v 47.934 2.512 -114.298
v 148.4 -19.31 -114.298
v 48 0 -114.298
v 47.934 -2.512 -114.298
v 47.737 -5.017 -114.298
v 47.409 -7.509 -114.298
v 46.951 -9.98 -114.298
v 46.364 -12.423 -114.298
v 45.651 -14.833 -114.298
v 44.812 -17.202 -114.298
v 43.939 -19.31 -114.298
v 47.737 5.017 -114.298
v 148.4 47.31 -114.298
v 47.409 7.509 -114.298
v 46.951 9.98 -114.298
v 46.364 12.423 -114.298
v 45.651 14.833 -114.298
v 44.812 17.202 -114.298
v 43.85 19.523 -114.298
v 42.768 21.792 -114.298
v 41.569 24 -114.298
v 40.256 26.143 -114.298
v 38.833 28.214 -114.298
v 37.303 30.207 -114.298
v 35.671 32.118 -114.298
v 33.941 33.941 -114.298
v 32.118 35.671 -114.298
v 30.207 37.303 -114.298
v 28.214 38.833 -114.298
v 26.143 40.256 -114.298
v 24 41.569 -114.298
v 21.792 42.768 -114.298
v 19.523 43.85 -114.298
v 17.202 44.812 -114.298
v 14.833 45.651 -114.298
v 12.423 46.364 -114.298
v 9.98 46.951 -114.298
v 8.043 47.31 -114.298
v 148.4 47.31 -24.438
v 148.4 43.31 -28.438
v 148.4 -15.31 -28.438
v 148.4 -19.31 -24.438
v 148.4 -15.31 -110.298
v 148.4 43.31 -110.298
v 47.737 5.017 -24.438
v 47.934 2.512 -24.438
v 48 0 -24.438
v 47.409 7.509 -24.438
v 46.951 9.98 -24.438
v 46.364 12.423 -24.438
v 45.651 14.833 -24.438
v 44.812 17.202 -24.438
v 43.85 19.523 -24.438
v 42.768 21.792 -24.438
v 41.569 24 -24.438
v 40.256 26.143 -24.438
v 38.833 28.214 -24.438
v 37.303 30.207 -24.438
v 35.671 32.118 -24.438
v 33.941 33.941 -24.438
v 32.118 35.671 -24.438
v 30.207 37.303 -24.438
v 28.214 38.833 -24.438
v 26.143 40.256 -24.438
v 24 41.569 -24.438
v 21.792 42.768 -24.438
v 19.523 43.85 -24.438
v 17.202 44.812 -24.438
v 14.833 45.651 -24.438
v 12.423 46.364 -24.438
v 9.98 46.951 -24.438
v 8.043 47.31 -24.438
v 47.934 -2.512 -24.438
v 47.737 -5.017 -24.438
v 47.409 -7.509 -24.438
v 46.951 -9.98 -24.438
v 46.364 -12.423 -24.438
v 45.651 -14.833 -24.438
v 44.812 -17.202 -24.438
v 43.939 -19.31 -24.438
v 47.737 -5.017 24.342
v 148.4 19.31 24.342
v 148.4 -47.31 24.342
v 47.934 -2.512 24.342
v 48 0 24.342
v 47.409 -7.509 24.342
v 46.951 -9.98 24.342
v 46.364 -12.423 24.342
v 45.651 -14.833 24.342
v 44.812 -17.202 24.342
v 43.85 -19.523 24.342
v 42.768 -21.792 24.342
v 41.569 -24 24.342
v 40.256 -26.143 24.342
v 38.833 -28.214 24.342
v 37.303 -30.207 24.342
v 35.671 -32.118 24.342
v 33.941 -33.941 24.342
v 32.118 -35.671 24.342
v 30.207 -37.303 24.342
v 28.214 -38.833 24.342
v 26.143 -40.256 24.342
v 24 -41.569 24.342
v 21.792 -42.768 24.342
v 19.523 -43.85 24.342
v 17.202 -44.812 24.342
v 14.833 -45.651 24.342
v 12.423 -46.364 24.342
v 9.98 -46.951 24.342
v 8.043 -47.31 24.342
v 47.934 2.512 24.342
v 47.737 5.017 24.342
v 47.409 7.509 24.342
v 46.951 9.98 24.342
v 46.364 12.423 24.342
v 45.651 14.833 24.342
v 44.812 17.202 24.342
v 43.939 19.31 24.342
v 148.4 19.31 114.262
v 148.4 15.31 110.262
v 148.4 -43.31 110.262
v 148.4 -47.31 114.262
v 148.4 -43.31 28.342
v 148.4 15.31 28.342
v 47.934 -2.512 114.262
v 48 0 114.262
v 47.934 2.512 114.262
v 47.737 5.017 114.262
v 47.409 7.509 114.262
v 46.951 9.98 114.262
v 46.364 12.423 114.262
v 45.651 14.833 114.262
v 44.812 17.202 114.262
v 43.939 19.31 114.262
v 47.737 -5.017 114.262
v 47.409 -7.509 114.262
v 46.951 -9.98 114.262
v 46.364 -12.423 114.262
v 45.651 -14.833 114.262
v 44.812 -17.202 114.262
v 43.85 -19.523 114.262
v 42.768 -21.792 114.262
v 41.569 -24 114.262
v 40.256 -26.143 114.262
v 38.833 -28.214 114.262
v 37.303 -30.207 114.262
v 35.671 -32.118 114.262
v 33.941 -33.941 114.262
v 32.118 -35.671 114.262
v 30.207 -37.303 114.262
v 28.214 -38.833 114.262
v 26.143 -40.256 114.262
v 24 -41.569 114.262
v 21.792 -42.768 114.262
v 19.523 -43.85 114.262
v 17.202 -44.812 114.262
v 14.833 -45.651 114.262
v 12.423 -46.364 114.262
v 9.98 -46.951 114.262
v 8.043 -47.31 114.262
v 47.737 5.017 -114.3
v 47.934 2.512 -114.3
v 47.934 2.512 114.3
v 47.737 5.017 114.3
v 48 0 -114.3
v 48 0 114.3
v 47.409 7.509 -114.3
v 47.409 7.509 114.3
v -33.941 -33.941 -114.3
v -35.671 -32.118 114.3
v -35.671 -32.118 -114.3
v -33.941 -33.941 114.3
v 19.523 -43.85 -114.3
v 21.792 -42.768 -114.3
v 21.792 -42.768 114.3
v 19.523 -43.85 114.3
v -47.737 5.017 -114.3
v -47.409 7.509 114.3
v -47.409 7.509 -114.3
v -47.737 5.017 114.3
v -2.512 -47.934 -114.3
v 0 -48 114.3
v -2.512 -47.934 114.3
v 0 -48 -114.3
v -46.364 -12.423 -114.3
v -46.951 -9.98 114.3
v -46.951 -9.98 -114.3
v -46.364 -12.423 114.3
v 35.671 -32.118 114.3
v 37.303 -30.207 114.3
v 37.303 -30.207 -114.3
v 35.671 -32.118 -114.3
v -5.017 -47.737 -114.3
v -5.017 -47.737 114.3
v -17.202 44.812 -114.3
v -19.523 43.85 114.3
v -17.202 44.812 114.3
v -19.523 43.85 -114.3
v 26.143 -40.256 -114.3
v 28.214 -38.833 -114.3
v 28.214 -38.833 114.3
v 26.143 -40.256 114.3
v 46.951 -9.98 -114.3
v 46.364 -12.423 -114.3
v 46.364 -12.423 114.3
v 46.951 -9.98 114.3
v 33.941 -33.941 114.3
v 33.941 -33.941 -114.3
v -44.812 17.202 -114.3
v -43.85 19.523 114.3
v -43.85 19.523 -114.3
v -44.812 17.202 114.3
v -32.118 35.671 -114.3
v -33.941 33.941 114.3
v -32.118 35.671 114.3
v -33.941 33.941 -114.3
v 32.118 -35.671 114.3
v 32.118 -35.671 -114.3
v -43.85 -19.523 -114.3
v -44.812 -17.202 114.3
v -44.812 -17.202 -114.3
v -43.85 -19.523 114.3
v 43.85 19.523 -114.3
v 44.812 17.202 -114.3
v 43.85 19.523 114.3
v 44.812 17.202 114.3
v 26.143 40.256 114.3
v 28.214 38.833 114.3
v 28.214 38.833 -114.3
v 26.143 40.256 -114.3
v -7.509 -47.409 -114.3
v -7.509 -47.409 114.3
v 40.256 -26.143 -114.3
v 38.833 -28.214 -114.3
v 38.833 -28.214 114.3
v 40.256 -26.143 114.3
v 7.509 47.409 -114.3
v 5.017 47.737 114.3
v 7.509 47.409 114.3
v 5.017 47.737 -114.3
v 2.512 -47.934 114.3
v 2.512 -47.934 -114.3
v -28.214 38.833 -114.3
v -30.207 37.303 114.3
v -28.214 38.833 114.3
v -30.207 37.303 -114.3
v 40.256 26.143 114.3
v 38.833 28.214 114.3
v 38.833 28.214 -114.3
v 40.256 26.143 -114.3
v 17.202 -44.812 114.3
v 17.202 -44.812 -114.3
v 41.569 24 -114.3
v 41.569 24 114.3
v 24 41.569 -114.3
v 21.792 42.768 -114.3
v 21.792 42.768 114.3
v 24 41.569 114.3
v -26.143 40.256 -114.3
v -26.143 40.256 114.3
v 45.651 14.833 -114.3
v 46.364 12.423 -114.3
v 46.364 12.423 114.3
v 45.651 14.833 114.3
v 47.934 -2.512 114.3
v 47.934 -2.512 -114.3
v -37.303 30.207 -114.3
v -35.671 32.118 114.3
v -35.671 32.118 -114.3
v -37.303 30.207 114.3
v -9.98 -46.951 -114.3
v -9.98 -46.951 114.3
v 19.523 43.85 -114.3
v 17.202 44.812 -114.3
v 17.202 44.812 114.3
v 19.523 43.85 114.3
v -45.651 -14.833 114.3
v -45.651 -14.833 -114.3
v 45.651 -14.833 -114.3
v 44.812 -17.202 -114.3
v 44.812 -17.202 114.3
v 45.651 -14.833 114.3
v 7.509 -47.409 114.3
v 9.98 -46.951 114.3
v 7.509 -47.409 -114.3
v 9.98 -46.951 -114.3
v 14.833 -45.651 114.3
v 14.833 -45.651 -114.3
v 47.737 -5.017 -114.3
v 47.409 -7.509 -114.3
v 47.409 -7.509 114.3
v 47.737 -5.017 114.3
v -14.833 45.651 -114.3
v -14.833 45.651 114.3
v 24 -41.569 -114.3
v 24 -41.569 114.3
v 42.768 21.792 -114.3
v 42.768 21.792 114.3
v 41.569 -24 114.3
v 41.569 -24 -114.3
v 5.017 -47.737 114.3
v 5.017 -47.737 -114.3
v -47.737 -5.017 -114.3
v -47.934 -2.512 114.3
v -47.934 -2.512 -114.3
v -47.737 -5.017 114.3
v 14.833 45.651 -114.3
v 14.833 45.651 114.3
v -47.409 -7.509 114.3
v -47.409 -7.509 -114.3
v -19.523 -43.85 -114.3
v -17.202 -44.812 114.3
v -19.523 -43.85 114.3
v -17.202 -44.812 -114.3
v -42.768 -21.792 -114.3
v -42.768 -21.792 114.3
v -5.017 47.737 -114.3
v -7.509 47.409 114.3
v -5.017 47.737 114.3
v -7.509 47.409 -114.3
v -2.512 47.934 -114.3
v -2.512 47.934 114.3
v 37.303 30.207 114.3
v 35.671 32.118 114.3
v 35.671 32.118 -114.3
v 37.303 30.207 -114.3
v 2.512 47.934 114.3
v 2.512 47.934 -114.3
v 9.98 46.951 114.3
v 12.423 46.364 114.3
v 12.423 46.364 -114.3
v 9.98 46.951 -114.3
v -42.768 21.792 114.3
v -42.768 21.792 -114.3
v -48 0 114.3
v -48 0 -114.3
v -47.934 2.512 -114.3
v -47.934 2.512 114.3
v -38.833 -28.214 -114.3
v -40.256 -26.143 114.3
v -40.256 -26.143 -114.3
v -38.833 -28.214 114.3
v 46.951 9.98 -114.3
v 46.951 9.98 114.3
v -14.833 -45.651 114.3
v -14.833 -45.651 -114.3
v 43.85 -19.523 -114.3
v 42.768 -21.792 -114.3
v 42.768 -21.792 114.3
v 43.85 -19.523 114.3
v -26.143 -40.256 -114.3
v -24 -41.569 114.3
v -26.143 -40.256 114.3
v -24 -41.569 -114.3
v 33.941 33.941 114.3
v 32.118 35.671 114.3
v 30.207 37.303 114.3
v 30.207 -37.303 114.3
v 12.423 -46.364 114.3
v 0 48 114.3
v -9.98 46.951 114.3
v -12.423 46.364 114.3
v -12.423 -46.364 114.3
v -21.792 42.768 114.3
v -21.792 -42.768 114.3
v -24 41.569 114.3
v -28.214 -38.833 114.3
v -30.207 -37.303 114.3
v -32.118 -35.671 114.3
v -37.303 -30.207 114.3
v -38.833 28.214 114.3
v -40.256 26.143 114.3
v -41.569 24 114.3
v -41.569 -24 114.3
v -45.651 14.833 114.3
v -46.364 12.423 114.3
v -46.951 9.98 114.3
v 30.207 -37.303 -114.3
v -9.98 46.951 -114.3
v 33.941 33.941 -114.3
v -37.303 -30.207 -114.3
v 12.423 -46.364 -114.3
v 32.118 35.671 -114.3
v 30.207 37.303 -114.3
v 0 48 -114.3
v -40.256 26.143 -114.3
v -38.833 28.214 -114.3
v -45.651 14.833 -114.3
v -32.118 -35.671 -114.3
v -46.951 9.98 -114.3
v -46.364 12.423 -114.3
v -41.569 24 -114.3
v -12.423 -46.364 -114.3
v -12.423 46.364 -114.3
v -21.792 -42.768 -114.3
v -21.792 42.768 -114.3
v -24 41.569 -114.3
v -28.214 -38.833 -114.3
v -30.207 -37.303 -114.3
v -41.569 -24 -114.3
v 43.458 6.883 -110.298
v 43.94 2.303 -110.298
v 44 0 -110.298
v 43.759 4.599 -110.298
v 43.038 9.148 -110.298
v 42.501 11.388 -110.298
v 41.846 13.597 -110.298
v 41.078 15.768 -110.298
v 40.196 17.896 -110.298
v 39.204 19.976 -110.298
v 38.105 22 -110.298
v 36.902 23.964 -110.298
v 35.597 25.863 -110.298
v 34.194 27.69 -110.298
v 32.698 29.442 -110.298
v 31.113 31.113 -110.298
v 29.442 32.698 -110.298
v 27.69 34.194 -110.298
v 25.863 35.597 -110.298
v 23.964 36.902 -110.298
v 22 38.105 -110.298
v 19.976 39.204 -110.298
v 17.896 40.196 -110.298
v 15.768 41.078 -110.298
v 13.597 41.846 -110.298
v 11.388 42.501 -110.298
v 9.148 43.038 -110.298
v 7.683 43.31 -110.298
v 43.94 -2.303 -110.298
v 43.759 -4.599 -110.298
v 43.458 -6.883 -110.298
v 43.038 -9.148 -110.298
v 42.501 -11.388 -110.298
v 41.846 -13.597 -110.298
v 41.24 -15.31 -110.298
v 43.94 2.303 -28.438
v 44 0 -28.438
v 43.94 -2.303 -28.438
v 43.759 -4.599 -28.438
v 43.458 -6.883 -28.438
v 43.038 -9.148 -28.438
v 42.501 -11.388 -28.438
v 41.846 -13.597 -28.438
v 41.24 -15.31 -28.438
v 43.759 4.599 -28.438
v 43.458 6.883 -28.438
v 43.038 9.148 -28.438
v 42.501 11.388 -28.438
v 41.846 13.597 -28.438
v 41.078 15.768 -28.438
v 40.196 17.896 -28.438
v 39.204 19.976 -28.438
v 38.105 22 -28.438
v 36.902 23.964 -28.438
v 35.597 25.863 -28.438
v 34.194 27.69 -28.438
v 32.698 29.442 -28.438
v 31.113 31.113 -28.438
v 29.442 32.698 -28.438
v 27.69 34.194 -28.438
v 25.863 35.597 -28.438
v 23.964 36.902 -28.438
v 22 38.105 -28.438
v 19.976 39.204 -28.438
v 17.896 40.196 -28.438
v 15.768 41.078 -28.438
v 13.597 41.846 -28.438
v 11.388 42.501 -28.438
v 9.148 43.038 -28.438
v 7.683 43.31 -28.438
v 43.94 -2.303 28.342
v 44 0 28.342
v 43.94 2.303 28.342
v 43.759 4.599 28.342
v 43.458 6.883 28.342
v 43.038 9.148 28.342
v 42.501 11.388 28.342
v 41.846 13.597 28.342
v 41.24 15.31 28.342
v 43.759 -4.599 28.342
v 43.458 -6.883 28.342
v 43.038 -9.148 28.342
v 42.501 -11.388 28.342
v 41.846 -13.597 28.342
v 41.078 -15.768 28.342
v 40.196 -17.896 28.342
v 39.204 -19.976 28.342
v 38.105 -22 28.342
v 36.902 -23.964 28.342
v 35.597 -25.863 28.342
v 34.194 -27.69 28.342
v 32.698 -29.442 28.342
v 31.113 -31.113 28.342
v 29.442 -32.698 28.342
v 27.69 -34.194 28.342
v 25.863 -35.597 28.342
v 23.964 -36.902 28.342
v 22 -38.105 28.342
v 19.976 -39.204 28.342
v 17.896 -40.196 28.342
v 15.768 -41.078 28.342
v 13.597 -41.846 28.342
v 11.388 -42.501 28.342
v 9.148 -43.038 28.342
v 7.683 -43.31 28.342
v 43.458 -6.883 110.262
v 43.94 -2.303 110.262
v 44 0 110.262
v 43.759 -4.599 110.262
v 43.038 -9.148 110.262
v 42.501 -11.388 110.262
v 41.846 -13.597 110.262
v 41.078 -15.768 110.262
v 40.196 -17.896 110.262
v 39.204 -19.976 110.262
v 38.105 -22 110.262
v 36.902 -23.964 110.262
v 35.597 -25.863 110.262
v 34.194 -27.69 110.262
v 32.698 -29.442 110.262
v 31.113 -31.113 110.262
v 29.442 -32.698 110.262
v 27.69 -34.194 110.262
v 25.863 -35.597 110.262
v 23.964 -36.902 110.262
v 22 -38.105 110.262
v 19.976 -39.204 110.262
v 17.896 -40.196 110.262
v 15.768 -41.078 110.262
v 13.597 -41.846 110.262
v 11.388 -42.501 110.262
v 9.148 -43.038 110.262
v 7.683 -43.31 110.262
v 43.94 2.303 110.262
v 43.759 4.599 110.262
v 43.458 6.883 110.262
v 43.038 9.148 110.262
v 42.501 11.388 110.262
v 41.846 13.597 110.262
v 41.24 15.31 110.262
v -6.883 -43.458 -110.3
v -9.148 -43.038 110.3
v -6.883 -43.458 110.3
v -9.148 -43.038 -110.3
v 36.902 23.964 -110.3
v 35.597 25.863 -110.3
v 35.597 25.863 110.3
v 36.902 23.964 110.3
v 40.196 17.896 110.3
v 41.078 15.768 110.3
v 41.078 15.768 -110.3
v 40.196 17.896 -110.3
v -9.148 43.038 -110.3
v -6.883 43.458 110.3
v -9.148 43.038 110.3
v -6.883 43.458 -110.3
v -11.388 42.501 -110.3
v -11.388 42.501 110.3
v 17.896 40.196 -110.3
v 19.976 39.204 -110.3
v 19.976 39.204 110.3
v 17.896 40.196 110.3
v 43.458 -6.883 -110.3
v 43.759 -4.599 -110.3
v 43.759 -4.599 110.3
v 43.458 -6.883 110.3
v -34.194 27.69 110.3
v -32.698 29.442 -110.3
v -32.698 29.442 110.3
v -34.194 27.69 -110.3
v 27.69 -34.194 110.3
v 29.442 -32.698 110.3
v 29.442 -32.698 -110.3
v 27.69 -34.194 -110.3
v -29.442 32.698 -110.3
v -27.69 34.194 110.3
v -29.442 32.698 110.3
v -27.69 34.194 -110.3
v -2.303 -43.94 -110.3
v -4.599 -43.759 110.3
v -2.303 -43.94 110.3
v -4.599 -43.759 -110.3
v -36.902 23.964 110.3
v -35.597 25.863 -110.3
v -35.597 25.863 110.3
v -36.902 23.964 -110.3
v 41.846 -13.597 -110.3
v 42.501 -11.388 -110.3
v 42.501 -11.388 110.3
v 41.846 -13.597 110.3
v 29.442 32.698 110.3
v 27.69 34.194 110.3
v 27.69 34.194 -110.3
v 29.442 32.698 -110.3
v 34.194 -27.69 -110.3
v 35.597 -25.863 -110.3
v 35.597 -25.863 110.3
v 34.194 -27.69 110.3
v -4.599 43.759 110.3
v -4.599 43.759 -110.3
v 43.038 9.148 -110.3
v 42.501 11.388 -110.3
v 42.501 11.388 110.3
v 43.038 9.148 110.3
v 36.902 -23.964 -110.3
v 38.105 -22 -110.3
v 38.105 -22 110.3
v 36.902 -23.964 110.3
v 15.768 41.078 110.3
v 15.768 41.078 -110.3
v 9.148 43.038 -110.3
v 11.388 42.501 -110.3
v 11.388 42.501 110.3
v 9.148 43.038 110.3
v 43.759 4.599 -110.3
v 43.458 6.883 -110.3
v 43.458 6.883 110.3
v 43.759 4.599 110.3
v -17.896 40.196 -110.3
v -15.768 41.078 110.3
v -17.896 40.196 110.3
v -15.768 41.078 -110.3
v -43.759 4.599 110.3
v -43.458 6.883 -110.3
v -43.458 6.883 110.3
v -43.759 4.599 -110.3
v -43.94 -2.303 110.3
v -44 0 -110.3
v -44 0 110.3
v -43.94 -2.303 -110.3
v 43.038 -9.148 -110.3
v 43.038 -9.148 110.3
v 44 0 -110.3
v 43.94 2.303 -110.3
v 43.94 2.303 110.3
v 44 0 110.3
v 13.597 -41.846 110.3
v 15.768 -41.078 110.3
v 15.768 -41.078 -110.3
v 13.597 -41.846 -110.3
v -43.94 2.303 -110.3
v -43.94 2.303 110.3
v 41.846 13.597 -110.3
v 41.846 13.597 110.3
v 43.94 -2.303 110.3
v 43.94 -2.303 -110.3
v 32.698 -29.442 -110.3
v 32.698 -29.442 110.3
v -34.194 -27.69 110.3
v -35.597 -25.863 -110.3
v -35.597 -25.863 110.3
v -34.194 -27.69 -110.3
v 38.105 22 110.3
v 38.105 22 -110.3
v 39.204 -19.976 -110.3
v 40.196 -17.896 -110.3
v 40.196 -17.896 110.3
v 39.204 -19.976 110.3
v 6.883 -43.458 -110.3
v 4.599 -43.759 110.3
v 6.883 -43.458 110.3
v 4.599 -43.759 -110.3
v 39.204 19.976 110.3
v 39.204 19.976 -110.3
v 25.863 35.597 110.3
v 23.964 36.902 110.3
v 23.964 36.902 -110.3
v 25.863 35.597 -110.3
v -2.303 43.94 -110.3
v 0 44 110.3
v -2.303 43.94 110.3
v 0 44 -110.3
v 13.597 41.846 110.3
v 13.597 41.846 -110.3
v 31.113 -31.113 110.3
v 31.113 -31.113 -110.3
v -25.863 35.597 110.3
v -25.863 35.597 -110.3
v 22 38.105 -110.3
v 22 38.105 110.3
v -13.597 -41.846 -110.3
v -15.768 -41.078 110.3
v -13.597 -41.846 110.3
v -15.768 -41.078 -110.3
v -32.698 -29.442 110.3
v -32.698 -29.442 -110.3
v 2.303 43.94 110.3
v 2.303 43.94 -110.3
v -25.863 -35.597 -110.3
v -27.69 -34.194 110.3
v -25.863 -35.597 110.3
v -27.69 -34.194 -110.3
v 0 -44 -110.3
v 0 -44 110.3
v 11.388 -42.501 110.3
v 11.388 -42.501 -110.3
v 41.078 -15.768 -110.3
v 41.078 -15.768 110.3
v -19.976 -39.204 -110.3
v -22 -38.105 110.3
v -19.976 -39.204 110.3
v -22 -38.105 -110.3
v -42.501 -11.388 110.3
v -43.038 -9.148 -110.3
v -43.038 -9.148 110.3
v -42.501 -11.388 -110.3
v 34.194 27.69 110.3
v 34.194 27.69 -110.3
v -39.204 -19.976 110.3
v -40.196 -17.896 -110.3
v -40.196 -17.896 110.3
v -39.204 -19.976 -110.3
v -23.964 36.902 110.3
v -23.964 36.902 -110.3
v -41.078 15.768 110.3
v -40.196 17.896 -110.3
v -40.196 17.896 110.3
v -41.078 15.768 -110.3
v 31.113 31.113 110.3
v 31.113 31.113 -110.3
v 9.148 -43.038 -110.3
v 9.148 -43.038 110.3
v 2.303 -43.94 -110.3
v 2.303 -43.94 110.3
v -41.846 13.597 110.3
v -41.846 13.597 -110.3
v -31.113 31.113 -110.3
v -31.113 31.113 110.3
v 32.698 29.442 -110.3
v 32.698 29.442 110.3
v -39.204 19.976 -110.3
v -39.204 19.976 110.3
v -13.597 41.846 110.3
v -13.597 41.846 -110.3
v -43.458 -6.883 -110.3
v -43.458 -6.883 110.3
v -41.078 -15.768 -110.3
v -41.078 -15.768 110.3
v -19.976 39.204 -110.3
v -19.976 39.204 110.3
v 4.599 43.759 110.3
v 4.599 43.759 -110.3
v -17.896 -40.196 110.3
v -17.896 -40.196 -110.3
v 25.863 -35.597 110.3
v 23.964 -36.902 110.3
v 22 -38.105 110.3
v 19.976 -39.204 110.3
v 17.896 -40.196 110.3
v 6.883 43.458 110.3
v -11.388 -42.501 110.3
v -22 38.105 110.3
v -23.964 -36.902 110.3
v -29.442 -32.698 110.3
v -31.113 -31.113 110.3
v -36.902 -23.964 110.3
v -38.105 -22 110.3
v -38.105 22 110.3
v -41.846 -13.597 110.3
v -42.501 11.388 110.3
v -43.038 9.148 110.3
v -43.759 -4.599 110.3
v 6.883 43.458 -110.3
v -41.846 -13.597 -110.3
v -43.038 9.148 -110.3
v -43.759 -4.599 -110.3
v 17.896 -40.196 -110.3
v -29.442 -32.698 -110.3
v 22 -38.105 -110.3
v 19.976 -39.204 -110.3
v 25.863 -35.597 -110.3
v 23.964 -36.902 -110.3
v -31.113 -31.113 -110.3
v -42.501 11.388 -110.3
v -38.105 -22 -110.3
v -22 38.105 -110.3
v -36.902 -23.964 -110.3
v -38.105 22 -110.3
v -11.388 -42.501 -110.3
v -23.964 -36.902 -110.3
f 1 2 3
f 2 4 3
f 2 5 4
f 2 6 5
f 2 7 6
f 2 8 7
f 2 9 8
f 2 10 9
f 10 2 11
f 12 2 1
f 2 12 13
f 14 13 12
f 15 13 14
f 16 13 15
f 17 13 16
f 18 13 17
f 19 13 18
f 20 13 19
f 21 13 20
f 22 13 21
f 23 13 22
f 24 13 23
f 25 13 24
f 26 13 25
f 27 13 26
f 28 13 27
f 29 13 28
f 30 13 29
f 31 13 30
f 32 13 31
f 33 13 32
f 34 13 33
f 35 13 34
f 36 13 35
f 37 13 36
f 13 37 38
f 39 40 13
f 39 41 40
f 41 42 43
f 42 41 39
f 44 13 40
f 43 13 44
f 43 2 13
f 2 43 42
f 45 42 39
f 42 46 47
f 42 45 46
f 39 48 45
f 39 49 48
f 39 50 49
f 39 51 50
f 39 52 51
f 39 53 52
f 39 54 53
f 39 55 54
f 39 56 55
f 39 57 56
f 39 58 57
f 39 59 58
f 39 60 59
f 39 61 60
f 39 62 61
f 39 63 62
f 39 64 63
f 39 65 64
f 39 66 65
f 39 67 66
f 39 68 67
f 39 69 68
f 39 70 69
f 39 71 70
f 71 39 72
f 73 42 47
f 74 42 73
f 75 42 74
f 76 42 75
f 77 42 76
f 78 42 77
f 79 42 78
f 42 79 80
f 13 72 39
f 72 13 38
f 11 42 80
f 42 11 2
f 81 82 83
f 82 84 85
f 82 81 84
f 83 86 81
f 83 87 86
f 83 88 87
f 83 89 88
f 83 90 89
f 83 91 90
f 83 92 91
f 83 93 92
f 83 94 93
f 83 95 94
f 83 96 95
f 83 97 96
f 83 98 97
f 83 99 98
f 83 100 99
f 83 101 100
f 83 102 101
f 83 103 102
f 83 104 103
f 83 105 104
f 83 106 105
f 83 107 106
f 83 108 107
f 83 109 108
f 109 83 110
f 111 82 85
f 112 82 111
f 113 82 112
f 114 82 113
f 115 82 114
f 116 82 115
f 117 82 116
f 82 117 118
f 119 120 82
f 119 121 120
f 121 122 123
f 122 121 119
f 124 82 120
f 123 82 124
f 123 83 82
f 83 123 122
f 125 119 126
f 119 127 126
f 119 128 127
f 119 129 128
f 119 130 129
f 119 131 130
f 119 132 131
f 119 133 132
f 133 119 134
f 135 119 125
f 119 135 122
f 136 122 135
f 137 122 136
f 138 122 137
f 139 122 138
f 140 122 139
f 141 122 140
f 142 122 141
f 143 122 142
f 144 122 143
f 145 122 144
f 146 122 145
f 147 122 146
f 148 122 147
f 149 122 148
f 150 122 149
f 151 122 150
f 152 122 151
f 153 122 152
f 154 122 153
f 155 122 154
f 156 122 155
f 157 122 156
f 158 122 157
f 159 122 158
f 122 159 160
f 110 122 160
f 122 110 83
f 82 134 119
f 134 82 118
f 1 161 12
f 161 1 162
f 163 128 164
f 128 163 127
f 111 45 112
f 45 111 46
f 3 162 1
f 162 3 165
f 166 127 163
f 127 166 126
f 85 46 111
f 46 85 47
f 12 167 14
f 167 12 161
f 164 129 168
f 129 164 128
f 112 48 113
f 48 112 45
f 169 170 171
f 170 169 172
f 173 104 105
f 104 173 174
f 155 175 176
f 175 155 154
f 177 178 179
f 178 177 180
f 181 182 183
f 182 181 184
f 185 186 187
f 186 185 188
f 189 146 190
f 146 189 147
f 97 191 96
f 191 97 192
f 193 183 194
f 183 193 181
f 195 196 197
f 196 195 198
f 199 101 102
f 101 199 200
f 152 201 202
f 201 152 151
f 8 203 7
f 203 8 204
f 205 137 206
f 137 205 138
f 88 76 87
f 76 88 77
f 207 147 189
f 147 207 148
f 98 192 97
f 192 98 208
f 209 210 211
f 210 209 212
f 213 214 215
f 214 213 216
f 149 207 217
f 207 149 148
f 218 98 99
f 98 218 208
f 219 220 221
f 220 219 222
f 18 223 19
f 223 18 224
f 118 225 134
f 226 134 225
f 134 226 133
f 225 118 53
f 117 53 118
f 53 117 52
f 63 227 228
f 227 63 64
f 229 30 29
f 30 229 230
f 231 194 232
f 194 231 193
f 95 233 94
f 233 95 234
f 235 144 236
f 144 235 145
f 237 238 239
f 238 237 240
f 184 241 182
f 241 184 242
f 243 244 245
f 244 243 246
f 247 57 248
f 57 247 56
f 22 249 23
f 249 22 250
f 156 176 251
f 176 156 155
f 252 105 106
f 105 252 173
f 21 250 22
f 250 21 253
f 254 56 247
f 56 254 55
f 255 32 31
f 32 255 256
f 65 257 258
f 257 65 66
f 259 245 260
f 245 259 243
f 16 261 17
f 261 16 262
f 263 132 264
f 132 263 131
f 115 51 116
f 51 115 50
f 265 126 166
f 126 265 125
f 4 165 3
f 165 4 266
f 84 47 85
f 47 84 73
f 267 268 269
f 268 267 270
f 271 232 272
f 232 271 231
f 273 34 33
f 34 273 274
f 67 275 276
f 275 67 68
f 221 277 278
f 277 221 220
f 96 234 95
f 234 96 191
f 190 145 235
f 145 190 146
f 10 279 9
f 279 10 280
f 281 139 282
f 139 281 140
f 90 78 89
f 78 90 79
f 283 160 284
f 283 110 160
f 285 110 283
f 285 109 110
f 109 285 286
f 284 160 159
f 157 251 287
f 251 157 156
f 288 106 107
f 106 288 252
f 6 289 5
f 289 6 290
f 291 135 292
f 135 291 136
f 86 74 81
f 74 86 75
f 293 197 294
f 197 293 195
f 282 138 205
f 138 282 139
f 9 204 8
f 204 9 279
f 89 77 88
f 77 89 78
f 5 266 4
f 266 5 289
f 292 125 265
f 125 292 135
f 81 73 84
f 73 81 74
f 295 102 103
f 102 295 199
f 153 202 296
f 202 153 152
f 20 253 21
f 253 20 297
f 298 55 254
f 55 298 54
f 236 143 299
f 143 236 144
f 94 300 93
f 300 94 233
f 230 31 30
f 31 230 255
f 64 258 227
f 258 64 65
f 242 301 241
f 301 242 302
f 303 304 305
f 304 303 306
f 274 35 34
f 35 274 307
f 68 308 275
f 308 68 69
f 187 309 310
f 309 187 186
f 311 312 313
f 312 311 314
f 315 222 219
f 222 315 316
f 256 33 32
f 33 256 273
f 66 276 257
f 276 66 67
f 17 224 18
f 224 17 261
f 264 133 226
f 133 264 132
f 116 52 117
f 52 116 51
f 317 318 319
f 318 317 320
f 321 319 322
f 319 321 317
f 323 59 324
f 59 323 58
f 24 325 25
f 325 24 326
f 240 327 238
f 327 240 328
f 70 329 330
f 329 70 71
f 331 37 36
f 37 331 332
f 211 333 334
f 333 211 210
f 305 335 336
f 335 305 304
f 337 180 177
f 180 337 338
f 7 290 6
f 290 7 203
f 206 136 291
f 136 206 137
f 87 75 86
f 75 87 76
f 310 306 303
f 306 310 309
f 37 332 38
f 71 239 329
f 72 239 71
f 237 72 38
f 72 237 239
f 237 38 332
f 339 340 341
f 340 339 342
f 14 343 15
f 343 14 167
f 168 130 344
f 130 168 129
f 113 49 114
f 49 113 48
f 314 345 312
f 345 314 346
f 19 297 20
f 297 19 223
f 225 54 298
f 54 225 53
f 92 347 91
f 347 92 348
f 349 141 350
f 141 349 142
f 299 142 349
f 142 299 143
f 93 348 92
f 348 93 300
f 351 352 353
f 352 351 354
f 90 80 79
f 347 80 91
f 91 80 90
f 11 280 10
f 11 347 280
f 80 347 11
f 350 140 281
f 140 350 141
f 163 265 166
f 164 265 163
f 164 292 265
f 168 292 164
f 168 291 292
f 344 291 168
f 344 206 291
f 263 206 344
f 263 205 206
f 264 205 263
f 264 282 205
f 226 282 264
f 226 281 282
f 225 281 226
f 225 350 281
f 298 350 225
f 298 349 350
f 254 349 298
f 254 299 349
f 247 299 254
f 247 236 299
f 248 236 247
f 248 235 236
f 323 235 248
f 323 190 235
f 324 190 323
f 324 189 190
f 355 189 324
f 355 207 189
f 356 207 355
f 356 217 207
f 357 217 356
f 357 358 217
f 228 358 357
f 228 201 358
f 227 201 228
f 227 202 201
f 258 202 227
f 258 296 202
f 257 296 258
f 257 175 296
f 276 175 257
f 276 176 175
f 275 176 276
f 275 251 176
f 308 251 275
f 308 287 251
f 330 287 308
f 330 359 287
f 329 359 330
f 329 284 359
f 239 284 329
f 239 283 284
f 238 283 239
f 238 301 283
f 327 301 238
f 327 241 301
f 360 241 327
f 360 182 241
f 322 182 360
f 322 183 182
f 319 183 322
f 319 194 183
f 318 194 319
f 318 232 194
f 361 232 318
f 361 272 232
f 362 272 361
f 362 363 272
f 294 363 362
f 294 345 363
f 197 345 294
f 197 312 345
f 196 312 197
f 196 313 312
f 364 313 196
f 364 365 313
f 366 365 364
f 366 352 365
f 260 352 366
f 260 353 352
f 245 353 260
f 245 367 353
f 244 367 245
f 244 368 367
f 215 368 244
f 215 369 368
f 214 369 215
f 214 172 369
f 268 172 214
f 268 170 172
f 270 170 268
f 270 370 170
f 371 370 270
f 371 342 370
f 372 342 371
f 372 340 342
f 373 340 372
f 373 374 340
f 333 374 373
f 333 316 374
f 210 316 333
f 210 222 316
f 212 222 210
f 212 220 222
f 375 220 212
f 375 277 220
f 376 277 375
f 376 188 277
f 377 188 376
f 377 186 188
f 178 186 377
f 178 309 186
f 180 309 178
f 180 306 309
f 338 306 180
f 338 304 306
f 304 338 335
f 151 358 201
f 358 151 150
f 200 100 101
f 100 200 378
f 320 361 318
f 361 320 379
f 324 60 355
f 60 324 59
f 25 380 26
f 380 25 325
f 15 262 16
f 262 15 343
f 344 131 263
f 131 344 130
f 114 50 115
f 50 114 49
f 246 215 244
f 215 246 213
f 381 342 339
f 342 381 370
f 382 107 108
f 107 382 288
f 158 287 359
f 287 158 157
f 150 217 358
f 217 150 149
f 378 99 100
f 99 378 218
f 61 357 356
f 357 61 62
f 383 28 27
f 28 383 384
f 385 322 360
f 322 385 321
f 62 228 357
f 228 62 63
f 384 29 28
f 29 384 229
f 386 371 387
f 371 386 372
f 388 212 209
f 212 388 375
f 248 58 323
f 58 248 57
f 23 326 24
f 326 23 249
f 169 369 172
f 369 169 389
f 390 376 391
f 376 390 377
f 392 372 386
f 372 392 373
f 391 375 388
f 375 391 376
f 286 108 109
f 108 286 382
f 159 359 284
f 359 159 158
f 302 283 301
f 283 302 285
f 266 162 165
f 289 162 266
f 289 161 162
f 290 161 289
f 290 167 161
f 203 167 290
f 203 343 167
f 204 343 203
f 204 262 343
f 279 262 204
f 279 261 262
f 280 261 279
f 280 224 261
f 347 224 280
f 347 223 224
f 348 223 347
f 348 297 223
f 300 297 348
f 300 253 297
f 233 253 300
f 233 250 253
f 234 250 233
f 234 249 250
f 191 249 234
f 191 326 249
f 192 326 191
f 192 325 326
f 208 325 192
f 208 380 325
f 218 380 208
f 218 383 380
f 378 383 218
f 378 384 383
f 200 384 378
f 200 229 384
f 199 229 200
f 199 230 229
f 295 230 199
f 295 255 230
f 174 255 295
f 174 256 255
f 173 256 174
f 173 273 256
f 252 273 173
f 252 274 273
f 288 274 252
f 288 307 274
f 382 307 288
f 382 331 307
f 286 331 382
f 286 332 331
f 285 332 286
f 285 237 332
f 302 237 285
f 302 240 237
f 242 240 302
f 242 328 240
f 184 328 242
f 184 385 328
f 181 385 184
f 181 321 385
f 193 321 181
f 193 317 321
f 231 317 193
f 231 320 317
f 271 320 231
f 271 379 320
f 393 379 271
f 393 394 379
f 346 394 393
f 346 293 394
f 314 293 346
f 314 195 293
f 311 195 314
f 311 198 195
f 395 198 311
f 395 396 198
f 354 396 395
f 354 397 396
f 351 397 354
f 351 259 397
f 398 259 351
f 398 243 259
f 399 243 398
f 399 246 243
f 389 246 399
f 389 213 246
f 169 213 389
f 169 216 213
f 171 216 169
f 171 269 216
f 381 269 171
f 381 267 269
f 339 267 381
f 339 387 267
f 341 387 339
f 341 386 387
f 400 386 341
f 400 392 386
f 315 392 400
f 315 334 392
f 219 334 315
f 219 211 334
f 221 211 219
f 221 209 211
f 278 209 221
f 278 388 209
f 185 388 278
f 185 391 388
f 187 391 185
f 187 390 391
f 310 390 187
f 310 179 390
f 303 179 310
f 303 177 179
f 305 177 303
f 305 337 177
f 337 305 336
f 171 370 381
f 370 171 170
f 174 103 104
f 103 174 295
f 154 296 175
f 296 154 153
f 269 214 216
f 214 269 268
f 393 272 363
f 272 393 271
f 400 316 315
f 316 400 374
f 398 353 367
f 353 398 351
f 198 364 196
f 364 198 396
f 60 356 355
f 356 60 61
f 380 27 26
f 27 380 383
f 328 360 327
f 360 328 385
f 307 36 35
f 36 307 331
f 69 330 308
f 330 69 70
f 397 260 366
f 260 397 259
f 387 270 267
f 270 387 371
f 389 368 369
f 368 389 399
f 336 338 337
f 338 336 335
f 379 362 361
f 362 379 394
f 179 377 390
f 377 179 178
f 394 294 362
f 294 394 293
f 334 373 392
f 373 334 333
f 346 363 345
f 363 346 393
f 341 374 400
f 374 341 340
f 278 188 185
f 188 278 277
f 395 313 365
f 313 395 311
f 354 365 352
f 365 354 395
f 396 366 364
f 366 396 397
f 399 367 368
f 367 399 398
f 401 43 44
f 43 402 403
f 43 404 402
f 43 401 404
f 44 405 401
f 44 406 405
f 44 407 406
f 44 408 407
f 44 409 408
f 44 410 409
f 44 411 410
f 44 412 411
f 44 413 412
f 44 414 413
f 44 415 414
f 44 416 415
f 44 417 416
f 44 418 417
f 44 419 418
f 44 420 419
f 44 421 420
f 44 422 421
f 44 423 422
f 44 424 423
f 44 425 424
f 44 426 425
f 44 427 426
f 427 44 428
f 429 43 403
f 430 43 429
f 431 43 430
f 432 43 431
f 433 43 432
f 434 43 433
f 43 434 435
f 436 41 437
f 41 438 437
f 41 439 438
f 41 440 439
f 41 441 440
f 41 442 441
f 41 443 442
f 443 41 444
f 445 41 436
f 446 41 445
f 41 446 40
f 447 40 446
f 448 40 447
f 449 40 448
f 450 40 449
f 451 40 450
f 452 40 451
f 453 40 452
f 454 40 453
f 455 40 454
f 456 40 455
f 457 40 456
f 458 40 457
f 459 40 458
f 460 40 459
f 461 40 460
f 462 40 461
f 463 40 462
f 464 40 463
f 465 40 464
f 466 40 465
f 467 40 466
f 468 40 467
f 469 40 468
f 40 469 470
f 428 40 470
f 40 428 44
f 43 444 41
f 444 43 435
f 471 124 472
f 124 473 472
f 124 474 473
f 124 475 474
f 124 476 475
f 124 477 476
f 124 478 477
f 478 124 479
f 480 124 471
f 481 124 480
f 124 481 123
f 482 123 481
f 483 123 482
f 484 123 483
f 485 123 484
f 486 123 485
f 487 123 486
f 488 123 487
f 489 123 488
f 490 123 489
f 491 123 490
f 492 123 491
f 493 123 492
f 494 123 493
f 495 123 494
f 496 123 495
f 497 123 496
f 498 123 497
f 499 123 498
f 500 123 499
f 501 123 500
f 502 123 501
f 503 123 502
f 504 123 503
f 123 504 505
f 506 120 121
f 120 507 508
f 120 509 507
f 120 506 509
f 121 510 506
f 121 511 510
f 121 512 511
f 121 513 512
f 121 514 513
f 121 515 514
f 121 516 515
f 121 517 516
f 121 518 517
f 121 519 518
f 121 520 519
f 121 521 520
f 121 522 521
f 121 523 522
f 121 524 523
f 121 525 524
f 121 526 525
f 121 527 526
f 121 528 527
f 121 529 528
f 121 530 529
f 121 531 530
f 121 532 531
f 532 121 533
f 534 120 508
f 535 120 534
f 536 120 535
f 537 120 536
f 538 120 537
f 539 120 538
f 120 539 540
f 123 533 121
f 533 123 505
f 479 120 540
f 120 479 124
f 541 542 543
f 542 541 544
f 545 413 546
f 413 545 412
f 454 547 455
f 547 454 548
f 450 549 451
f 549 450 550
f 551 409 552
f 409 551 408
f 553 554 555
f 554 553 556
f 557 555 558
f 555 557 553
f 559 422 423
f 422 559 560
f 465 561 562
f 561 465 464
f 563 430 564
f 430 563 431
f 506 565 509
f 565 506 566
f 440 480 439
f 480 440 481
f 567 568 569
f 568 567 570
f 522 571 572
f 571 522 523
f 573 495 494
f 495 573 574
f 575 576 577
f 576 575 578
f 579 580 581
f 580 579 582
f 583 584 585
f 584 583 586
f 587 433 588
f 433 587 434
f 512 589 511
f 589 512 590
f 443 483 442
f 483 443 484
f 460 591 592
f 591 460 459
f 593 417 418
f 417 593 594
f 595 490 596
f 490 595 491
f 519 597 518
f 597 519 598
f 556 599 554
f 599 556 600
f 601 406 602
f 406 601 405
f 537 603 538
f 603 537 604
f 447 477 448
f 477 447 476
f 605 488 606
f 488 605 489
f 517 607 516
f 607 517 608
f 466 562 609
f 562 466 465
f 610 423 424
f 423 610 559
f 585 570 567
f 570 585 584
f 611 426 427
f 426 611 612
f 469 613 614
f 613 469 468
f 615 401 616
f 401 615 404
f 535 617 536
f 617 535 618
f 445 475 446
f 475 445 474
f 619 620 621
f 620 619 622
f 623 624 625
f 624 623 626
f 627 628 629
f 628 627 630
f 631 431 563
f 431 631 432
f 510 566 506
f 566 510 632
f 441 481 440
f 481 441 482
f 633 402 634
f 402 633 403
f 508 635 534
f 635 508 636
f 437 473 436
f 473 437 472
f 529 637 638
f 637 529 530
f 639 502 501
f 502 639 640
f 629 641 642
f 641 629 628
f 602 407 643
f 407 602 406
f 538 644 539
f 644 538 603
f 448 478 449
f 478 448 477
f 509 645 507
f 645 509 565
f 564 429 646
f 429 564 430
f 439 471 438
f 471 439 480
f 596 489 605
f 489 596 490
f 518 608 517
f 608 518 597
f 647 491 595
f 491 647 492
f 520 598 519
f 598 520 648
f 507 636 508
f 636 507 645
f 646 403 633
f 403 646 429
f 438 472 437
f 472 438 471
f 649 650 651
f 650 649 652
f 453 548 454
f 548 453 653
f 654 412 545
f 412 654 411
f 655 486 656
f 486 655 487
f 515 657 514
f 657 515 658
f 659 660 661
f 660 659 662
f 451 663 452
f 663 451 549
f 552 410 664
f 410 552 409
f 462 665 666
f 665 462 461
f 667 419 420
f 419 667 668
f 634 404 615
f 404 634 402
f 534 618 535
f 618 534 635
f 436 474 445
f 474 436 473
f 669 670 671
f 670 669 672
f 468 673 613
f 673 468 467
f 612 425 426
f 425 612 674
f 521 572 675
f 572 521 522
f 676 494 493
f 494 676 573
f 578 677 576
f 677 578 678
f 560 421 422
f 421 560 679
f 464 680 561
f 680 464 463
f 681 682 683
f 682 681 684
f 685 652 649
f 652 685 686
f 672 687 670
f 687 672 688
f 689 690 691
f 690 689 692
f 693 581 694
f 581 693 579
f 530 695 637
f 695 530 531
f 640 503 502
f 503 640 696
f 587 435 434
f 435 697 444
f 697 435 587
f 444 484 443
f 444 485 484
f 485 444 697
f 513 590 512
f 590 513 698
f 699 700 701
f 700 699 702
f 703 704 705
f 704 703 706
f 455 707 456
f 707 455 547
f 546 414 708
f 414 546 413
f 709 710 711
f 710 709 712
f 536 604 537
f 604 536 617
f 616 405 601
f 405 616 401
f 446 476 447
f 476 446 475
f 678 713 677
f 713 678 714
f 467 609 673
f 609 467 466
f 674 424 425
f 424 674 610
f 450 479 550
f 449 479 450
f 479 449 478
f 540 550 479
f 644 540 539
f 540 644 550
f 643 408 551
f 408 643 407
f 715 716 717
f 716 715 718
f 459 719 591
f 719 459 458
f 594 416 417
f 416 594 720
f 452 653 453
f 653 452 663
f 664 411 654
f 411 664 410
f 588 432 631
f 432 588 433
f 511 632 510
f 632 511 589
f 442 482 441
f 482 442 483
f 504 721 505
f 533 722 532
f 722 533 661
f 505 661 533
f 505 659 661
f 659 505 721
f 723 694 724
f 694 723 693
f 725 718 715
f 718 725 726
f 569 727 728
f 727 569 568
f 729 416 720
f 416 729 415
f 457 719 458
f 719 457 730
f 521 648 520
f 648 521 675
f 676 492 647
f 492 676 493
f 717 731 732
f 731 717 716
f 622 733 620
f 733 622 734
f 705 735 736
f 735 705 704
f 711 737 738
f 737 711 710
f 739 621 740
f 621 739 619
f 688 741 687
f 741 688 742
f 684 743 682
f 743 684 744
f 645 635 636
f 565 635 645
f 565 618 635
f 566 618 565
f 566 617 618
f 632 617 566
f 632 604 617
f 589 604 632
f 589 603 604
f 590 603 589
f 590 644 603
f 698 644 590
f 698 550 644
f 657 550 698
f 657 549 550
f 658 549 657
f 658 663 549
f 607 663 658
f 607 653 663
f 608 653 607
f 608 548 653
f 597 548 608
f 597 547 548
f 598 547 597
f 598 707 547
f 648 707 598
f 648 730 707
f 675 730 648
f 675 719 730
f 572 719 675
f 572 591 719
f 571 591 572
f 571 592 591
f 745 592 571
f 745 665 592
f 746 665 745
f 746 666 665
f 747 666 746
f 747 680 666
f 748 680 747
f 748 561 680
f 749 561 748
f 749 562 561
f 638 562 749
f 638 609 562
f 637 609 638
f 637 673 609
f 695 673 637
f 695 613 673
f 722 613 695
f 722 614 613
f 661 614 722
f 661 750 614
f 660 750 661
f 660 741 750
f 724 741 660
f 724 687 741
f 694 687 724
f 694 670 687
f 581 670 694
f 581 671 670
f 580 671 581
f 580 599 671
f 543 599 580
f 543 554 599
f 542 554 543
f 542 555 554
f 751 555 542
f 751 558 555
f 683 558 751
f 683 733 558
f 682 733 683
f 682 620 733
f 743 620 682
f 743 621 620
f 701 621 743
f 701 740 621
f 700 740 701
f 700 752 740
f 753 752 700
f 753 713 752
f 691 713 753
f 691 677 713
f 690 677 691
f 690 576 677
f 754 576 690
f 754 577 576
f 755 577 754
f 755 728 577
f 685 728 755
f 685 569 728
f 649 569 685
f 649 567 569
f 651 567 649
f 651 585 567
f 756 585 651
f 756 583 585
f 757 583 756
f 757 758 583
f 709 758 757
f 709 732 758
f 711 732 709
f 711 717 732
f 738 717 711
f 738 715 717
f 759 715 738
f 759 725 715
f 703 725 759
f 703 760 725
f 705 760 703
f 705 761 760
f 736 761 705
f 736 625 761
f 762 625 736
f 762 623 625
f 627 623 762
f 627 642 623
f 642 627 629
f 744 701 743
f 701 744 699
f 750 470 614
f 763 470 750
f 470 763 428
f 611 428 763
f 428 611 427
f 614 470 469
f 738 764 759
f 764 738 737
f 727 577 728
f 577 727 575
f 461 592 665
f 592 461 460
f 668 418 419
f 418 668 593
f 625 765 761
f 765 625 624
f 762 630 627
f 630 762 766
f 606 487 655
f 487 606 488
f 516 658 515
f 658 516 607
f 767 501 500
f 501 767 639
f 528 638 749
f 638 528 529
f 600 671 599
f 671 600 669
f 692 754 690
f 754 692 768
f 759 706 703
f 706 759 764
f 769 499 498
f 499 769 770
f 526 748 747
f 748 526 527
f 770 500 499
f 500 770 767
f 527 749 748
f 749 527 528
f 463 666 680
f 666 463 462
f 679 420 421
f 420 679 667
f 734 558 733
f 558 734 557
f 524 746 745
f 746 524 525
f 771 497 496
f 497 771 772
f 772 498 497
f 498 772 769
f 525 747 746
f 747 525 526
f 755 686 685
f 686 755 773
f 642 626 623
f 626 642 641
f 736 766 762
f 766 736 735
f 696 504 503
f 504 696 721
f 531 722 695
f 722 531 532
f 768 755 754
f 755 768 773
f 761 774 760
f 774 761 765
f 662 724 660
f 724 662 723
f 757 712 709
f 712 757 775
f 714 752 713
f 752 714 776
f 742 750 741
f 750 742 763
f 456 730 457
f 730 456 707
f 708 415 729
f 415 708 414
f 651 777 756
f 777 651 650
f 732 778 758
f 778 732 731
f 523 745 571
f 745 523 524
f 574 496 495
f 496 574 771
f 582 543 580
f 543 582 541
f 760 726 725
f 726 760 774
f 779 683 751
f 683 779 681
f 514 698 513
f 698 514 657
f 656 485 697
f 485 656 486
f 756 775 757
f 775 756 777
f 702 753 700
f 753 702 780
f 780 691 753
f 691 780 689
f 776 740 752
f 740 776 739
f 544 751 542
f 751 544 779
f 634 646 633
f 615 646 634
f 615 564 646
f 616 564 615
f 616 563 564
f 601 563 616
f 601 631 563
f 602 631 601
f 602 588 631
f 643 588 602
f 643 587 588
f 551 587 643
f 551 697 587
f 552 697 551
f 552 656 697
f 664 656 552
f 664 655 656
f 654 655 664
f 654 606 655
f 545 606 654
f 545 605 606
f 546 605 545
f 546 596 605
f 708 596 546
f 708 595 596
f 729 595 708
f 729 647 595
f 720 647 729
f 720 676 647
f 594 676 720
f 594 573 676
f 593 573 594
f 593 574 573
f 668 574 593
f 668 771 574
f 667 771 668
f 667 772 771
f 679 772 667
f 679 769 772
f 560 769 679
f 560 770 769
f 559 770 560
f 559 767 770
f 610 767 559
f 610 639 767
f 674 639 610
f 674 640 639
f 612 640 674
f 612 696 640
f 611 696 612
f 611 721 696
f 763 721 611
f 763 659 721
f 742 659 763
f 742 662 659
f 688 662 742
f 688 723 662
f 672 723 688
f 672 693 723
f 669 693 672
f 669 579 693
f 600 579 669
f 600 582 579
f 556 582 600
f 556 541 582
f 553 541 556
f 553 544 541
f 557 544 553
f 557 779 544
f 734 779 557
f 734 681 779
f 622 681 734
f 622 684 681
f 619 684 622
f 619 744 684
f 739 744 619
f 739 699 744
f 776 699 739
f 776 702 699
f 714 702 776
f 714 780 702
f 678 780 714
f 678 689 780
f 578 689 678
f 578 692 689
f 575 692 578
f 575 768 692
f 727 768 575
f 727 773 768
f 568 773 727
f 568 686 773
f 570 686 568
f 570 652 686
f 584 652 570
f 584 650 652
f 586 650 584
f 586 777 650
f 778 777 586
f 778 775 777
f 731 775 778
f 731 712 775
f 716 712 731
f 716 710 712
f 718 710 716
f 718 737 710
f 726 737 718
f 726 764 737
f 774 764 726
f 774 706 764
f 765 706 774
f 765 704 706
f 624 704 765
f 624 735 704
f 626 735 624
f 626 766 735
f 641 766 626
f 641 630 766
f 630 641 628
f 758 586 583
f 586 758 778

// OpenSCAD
use <myTools-extended.scad>
$fn = $preview ? 50 : 120;

//DEBUG= $preview ? 0 : 1;
DEBUG= 1;
//=================================================

TWEAK = 1;
WHITE_W = 80.86 + TWEAK;
WHITE_L = 57.62 + TWEAK;

BLACK_W = 80.92 + TWEAK;
BLACK_L = 57.62 + TWEAK;

THICK=4;
PIPE_LEN = 9 * 25.4;
BOX_LEN = 6 * 25.4;

A = WHITE_W * WHITE_L; //square inches of down pipe

TRUE_DIA = (2 * sqrt( A /PI));
PIPE_iDIA = round( TRUE_DIA + 10);  // round up to nearest 10mm

RING_DIA = PIPE_iDIA + 10;
RING_LEN = 10;

echo ("pipe AREA = ", A, "sq mm");
echo ("pipe PIPE_iDIA = ", PIPE_iDIA,"mm");

SCREW_DIA= 3/16 * 25.4;

function AVG(a,b) = (a+b)/2;

//              T         D           H           TRANS     ROTATE   endcap endcap               
cylinder1 = [ THICK,     PIPE_iDIA,  PIPE_LEN,     [0,0,0], [0,0,0],  DEBUG, DEBUG ]; // dia, len, translate[x,y,z]

screw1 =    [ SCREW_DIA, SCREW_DIA*2, WHITE_W-THICK * 16/4, [115, -(BLACK_W/4 - THICK*3/2), (PIPE_LEN)/2], [90,0,0], 0, 0 ]; // dia, len, translate[x,y,z]
screw2 =    [ SCREW_DIA, SCREW_DIA*2, BLACK_W-THICK * 16/4, [115,  (BLACK_W/4 - THICK*3/2), -(PIPE_LEN)/2], [90,0,0], 0, 0 ]; // dia, len, translate[x,y,z]


//         T        DIM              TRANS                                                     ROTATE      L  R                  
white = [THICK, [ WHITE_W, WHITE_L, BOX_LEN] ,
        [   (BOX_LEN/2 - THICK), 
            (PIPE_iDIA/4 - THICK*2), 
            (-PIPE_LEN/2 + WHITE_L - THICK*3 - THICK * 27/64)
        ], 
        [ 0, 90, 0 ], 0, 0];
        
black = [THICK, [ BLACK_W, BLACK_L, BOX_LEN] , 
        [   (BOX_LEN/2 - THICK),
            -(PIPE_iDIA/4 - THICK*2),
            -(-PIPE_LEN/2 +BLACK_L/2 + THICK*3 +THICK * 59/64)],
        [ 0, 90, 0 ], 0, 0];

// make supports so prusa supports are not needed.
support1 = [-2, [ WHITE_W-.5, WHITE_L-.5, PIPE_LEN] , [ -BLACK_W/2, 0, PIPE_LEN/2],    [ 0, 0, 0 ], 0, 0];
support2 = [-2, [ BLACK_W-.5, BLACK_L-.5, PIPE_LEN] , [  BLACK_W/2+3, 0, PIPE_LEN/2], [ 0, 0, 0 ], 0, 0];


C_LIST = [cylinder1]; //, screw1, screw2]; //, cylinder3, cylinder4, cylinder5, cylinder6, cylinder7, cylinder8 ]; 
BOX_LIST=[white, black]; //[white, black];

SUPPORT_LIST=[support1]; // both are almost the same.
//------------------------------------------------------------
module make_drains()
{
    difference()
    {
        {
            difference()
            {
                union()
                {
                  #make_cylinders(action="BOM", PARTS_LIST=C_LIST)
                    make_cylinders(action="ADD", PARTS_LIST=C_LIST);
                    //
                  make_cubes("BOM", PARTS_LIST=BOX_LIST)
                    make_cubes("ADD", PARTS_LIST=BOX_LIST);
                }

              union()
              {
                  make_cylinders("BOM", PARTS_LIST=C_LIST)
                    make_cylinders("REMOVE", PARTS_LIST=C_LIST);

                  make_cubes("BOM", PARTS_LIST=BOX_LIST)
                    make_cubes("REMOVE", PARTS_LIST=BOX_LIST);
              }
            }
       }
       // trim ends to make flat
       // translate([0, 0,  (PIPE_LEN*2/3+ 20.)]) #cube([400,100,10], center=true);
       // translate([0, 0, -(PIPE_LEN*2/3+ 20)]) #cube([400,100,10], center=true);
    }
}
// -----------------------------------------------
module make_rings()
{
    difference()
    {
        difference()
        {
            union()
            {
              #make_cylinders(action="BOM", PARTS_LIST=C_LIST)
                make_cylinders(action="ADD", PARTS_LIST=C_LIST);
            }

          union()
          {
              make_cylinders("BOM", PARTS_LIST=C_LIST)
                make_cylinders("REMOVE", PARTS_LIST=C_LIST);
          }
        }
   }
}
//-------------------------------------------------------

module make_supports()
{
    difference()
    {
        union()
        {
          make_cubes("BOM", PARTS_LIST=SUPPORT_LIST)
            make_cubes("ADD", PARTS_LIST=SUPPORT_LIST);
        }

      union()
      {
          make_cubes("BOM", PARTS_LIST=SUPPORT_LIST)
            make_cubes("REMOVE", PARTS_LIST=SUPPORT_LIST);
      }
    }
}
// -----------------------------------------------
module make_rings()
{
    //ringSupport
    RING_HEIGHT=10;
    RING_WIDTH=20;
       
    //               WALL                 PIPE_iDIA      WIDE
    outside =   [ RING_HEIGHT,  // make bigger by this dia
                  PIPE_iDIA + THICK ,  // sit on outside of pipe
                  RING_WIDTH/2,   // fatness of ring
                  [0,0,0], [0,0,0],  DEBUG, DEBUG ];
                  
    seat =      [   THICK+.5,
                    PIPE_iDIA,   // start halfway on pipe dia
                    RING_WIDTH,
                    [0,0,RING_WIDTH/2],
                    [0,0,0],  DEBUG, DEBUG ];
     
    OUTER = [ outside];
    SEAT =  [ seat];
        translate([0, 0, RING_HEIGHT/2])
        difference()
        {
            union()
            {
              make_cylinders(action="BOM", PARTS_LIST=OUTER)
                make_cylinders(action="ADD", PARTS_LIST=OUTER);
/*
                make_cylinders("BOM", PARTS_LIST=SEAT);
                make_cylinders("ADD", PARTS_LIST=SEAT);
*/
            }

          union()
          {
              make_cylinders("BOM", PARTS_LIST=OUTER)
                make_cylinders("REMOVE", PARTS_LIST=OUTER);

if(1)
{                
              make_cylinders("BOM", PARTS_LIST=SEAT);
                make_cylinders("ADD", PARTS_LIST=SEAT);
}

             #cylinder(h=150, d= PIPE_iDIA, center = true);

          }
     }
    
}

make_drains();
//make_supports();
//make_rings();
